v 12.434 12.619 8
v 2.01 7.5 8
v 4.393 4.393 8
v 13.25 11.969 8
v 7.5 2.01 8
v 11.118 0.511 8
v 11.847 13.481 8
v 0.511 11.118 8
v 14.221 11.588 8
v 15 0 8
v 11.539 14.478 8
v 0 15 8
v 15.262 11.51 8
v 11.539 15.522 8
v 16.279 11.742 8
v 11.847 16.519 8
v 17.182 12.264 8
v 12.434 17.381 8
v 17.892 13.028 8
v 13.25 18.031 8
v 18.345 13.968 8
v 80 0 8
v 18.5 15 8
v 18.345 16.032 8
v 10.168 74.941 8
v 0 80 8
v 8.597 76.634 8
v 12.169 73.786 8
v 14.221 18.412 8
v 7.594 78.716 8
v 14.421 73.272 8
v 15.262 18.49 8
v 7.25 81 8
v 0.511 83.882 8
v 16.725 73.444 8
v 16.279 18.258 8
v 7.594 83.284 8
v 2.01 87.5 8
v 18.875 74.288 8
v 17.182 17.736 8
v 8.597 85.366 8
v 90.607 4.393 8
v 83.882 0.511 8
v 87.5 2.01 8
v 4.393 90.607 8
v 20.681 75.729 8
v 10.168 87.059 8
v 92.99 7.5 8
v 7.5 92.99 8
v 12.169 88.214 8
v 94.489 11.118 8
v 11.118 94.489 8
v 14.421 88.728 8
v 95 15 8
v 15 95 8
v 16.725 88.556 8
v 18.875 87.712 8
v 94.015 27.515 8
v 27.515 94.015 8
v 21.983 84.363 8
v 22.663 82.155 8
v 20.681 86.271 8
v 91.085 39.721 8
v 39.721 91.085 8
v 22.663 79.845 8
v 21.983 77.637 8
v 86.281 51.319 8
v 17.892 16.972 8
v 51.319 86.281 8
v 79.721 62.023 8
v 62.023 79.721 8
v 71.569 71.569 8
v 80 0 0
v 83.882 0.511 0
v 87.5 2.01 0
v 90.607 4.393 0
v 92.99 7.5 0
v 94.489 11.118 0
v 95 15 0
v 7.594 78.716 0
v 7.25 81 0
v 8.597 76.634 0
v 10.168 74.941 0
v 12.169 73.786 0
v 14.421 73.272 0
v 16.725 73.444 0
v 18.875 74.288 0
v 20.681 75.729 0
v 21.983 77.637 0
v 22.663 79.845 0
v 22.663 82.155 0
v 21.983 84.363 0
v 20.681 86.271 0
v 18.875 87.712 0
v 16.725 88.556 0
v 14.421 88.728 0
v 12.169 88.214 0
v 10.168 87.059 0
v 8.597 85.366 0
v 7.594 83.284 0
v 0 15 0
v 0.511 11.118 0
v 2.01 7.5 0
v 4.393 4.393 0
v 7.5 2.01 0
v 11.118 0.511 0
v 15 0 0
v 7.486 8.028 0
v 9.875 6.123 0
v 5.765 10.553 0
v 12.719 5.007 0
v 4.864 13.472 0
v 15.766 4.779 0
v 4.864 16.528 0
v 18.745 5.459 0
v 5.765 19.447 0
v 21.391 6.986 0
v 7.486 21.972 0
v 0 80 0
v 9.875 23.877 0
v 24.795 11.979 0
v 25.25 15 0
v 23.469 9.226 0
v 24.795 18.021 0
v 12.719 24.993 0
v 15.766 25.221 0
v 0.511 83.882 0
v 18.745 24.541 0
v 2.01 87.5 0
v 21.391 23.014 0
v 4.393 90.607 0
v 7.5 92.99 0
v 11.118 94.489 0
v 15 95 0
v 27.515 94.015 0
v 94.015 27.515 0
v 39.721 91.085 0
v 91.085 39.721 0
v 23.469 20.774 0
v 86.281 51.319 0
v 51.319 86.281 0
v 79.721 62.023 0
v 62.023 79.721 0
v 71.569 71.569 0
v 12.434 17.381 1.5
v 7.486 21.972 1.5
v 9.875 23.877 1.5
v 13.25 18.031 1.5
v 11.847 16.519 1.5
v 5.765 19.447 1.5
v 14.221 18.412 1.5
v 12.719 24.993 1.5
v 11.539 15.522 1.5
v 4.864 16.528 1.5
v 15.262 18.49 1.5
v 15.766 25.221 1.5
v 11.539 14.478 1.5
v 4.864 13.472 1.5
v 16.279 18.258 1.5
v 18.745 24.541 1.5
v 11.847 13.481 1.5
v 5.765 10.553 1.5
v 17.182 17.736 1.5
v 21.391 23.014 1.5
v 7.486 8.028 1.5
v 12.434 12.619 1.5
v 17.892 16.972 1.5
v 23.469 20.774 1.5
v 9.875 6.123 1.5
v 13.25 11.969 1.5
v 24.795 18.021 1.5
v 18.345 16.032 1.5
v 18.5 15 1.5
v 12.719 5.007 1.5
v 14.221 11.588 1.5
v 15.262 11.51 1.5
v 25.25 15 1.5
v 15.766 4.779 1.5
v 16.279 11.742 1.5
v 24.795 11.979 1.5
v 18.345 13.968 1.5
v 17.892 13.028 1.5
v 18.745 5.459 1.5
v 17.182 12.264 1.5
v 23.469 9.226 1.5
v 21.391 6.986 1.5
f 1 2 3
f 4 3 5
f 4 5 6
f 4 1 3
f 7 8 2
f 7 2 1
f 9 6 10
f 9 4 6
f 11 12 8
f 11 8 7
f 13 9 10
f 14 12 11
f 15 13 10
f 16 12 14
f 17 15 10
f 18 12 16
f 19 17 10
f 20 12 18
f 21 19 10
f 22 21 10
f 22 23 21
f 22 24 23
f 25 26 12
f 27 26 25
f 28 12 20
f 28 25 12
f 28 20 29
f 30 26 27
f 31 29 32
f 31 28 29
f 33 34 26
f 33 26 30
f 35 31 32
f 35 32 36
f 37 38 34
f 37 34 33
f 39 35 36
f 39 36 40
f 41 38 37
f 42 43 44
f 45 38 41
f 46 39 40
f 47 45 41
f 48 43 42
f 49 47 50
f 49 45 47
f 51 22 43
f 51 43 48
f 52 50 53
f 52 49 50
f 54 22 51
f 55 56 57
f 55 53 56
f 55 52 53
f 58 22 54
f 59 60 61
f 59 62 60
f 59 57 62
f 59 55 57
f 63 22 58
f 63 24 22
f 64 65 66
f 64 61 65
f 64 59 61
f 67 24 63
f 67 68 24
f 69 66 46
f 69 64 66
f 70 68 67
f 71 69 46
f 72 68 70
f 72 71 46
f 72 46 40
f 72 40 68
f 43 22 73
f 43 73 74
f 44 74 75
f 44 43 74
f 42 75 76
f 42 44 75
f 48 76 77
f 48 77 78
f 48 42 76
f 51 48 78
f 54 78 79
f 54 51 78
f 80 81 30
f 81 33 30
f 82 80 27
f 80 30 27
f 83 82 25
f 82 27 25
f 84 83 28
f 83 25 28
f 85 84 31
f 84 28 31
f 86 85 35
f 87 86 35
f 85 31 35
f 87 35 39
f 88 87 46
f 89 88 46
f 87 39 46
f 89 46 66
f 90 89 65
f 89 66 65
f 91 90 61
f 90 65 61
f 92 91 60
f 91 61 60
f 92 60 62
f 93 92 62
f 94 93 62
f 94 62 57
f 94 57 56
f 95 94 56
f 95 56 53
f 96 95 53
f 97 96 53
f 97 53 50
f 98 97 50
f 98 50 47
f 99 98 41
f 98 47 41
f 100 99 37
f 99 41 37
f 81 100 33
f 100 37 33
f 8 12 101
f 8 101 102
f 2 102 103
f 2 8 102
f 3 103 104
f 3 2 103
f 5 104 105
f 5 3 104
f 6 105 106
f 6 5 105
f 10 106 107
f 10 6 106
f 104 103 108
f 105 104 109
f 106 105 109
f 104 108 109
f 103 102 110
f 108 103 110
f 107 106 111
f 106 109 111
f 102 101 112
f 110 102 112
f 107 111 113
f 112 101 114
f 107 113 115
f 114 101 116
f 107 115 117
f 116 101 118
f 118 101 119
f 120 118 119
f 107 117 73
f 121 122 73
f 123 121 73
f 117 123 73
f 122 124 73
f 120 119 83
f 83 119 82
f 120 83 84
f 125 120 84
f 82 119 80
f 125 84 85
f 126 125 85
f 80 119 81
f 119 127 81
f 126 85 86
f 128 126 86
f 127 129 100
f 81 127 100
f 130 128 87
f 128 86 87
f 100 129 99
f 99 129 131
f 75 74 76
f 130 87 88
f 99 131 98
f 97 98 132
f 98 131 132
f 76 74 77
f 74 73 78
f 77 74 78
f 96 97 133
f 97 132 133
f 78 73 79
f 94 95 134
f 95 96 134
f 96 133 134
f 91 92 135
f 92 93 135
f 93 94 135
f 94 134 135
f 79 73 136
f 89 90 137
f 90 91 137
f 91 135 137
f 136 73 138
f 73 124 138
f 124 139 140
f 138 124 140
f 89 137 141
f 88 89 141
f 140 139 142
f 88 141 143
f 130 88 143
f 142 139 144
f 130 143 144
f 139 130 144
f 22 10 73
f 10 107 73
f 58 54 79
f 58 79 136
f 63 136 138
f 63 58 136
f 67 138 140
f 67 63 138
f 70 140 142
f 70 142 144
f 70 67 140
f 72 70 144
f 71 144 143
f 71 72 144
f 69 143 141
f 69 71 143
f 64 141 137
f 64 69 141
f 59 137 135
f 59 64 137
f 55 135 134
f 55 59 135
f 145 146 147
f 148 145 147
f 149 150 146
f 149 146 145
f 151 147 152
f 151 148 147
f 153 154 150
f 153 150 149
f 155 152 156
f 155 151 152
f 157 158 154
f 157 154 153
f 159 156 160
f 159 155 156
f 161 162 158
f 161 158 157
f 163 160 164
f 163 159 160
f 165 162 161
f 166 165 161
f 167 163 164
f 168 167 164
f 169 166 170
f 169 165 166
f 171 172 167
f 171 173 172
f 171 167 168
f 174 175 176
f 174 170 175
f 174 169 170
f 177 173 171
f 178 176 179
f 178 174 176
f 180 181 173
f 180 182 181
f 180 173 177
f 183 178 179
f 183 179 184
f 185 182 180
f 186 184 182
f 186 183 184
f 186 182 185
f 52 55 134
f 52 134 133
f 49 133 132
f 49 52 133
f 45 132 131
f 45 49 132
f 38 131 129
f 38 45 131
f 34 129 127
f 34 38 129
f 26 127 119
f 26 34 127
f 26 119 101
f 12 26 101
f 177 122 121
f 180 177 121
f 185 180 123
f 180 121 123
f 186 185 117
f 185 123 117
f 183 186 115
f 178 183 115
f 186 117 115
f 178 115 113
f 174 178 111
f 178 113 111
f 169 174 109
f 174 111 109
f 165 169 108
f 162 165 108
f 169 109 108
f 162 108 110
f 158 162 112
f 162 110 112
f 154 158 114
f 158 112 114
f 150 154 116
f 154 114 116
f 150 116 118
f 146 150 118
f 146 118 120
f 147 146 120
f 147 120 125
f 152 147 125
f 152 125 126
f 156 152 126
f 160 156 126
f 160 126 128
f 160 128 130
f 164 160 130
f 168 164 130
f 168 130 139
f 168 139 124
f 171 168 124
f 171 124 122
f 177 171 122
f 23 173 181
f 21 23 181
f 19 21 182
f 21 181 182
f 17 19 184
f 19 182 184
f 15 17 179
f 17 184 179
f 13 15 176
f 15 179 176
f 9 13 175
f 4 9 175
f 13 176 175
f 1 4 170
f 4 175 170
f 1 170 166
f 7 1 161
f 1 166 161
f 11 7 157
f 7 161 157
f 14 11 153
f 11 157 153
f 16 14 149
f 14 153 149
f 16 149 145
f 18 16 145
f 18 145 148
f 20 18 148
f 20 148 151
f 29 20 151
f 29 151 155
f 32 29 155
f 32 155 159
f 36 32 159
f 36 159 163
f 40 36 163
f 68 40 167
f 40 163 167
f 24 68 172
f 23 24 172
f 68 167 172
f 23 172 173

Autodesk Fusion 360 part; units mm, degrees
sketch "Smartie Arm" plane through (0, 0, 0) normal (0, 0, 1) x (1, 0, 0)
  line L0 (0, 0) -> (95, 0)
  line L1 (95, 0) -> (95, 95)
  line L2 (95, 95) -> (0, 95)
  line L3 (0, 95) -> (0, 0)
  dimension "d6" = 95
  dimension "d15" = 95
extrude "Extrude1" add sketch "Smartie Arm" along normal blind 8
sketch "Smartie Hole" plane through (0, 0, 8) normal (0, 0, 1) x (-1, 0, 0)
  line L0 (0, -95) -> (0, 0)
  line L1 (0, 0) -> (-95, 0)
  line L2 (-95, 0) -> (-95, -95)
  line L3 (-95, -95) -> (0, -95)
  circle A0 centre (-15, -81) radius 7.75
  dimension "d5" = 15.5
  dimension "d8" = 15
  dimension "d9" = 80
  dimension "d14" = 14
extrude "Extrude2" cut sketch "Smartie Hole" against normal blind 8 contours A0
fillet "Fillet1" radius 15 2 edges at (95, 95, 4) (0, 95, 4)
fillet "Fillet2" radius 15 2 edges at (0, 0, 4) (95, 0, 4)
sketch "Smartie Arm Arc" plane through (0, 0, 8) normal (0, 0, 1) x (-1, 0, 0)
  arc A0 (-80, 0) -> (-95, -15) centre (-80, -15) ccw
  line L0 (-95, -15) -> (-95, -80)
  arc A1 (-95, -80) -> (-80, -95) centre (-80, -80) ccw
  line L1 (-80, -95) -> (-15, -95)
  arc A2 (-15, -95) -> (0, -80) centre (-15, -80) ccw
  line L2 (0, -80) -> (0, -15)
  arc A3 (0, -15) -> (-15, 0) centre (-15, -15) ccw
  line L3 (-15, 0) -> (-80, 0)
  circle A4 centre (-15, -81) radius 7.75
  circle A5 centre (-15, -15) radius 80
  dimension "d16" = 15
  dimension "d17" = 15
  dimension "d18" = 160
extrude "Extrude3" cut sketch "Smartie Arm Arc" against normal blind 8 contours L0 A1 L1 A5
sketch "Servo Horn Hole" plane through (0, 0, 0) normal (0, 0, -1) x (1, 0, 0)
  arc A0 (15, -95) -> (95, -15) centre (15, -15) ccw
  arc A1 (95, -15) -> (80, 0) centre (80, -15) ccw
  line L0 (80, 0) -> (15, 0)
  arc A2 (15, 0) -> (0, -15) centre (15, -15) ccw
  line L1 (0, -15) -> (0, -80)
  arc A3 (0, -80) -> (15, -95) centre (15, -80) ccw
  circle A4 centre (15, -81) radius 7.75
  circle A5 centre (15, -15) radius 10.25
  circle A6 centre (15, -15) radius 3.5
  dimension "d21" = 20.5
  dimension "d24" = 7
extrude "Extrude4" cut sketch "Servo Horn Hole" against normal blind 1.5 contours A5 | A6
extrude "Extrude5" cut sketch "Servo Horn Hole" against normal blind 8 contours A6
equation "d14 = 16 mm - 2 mm"
